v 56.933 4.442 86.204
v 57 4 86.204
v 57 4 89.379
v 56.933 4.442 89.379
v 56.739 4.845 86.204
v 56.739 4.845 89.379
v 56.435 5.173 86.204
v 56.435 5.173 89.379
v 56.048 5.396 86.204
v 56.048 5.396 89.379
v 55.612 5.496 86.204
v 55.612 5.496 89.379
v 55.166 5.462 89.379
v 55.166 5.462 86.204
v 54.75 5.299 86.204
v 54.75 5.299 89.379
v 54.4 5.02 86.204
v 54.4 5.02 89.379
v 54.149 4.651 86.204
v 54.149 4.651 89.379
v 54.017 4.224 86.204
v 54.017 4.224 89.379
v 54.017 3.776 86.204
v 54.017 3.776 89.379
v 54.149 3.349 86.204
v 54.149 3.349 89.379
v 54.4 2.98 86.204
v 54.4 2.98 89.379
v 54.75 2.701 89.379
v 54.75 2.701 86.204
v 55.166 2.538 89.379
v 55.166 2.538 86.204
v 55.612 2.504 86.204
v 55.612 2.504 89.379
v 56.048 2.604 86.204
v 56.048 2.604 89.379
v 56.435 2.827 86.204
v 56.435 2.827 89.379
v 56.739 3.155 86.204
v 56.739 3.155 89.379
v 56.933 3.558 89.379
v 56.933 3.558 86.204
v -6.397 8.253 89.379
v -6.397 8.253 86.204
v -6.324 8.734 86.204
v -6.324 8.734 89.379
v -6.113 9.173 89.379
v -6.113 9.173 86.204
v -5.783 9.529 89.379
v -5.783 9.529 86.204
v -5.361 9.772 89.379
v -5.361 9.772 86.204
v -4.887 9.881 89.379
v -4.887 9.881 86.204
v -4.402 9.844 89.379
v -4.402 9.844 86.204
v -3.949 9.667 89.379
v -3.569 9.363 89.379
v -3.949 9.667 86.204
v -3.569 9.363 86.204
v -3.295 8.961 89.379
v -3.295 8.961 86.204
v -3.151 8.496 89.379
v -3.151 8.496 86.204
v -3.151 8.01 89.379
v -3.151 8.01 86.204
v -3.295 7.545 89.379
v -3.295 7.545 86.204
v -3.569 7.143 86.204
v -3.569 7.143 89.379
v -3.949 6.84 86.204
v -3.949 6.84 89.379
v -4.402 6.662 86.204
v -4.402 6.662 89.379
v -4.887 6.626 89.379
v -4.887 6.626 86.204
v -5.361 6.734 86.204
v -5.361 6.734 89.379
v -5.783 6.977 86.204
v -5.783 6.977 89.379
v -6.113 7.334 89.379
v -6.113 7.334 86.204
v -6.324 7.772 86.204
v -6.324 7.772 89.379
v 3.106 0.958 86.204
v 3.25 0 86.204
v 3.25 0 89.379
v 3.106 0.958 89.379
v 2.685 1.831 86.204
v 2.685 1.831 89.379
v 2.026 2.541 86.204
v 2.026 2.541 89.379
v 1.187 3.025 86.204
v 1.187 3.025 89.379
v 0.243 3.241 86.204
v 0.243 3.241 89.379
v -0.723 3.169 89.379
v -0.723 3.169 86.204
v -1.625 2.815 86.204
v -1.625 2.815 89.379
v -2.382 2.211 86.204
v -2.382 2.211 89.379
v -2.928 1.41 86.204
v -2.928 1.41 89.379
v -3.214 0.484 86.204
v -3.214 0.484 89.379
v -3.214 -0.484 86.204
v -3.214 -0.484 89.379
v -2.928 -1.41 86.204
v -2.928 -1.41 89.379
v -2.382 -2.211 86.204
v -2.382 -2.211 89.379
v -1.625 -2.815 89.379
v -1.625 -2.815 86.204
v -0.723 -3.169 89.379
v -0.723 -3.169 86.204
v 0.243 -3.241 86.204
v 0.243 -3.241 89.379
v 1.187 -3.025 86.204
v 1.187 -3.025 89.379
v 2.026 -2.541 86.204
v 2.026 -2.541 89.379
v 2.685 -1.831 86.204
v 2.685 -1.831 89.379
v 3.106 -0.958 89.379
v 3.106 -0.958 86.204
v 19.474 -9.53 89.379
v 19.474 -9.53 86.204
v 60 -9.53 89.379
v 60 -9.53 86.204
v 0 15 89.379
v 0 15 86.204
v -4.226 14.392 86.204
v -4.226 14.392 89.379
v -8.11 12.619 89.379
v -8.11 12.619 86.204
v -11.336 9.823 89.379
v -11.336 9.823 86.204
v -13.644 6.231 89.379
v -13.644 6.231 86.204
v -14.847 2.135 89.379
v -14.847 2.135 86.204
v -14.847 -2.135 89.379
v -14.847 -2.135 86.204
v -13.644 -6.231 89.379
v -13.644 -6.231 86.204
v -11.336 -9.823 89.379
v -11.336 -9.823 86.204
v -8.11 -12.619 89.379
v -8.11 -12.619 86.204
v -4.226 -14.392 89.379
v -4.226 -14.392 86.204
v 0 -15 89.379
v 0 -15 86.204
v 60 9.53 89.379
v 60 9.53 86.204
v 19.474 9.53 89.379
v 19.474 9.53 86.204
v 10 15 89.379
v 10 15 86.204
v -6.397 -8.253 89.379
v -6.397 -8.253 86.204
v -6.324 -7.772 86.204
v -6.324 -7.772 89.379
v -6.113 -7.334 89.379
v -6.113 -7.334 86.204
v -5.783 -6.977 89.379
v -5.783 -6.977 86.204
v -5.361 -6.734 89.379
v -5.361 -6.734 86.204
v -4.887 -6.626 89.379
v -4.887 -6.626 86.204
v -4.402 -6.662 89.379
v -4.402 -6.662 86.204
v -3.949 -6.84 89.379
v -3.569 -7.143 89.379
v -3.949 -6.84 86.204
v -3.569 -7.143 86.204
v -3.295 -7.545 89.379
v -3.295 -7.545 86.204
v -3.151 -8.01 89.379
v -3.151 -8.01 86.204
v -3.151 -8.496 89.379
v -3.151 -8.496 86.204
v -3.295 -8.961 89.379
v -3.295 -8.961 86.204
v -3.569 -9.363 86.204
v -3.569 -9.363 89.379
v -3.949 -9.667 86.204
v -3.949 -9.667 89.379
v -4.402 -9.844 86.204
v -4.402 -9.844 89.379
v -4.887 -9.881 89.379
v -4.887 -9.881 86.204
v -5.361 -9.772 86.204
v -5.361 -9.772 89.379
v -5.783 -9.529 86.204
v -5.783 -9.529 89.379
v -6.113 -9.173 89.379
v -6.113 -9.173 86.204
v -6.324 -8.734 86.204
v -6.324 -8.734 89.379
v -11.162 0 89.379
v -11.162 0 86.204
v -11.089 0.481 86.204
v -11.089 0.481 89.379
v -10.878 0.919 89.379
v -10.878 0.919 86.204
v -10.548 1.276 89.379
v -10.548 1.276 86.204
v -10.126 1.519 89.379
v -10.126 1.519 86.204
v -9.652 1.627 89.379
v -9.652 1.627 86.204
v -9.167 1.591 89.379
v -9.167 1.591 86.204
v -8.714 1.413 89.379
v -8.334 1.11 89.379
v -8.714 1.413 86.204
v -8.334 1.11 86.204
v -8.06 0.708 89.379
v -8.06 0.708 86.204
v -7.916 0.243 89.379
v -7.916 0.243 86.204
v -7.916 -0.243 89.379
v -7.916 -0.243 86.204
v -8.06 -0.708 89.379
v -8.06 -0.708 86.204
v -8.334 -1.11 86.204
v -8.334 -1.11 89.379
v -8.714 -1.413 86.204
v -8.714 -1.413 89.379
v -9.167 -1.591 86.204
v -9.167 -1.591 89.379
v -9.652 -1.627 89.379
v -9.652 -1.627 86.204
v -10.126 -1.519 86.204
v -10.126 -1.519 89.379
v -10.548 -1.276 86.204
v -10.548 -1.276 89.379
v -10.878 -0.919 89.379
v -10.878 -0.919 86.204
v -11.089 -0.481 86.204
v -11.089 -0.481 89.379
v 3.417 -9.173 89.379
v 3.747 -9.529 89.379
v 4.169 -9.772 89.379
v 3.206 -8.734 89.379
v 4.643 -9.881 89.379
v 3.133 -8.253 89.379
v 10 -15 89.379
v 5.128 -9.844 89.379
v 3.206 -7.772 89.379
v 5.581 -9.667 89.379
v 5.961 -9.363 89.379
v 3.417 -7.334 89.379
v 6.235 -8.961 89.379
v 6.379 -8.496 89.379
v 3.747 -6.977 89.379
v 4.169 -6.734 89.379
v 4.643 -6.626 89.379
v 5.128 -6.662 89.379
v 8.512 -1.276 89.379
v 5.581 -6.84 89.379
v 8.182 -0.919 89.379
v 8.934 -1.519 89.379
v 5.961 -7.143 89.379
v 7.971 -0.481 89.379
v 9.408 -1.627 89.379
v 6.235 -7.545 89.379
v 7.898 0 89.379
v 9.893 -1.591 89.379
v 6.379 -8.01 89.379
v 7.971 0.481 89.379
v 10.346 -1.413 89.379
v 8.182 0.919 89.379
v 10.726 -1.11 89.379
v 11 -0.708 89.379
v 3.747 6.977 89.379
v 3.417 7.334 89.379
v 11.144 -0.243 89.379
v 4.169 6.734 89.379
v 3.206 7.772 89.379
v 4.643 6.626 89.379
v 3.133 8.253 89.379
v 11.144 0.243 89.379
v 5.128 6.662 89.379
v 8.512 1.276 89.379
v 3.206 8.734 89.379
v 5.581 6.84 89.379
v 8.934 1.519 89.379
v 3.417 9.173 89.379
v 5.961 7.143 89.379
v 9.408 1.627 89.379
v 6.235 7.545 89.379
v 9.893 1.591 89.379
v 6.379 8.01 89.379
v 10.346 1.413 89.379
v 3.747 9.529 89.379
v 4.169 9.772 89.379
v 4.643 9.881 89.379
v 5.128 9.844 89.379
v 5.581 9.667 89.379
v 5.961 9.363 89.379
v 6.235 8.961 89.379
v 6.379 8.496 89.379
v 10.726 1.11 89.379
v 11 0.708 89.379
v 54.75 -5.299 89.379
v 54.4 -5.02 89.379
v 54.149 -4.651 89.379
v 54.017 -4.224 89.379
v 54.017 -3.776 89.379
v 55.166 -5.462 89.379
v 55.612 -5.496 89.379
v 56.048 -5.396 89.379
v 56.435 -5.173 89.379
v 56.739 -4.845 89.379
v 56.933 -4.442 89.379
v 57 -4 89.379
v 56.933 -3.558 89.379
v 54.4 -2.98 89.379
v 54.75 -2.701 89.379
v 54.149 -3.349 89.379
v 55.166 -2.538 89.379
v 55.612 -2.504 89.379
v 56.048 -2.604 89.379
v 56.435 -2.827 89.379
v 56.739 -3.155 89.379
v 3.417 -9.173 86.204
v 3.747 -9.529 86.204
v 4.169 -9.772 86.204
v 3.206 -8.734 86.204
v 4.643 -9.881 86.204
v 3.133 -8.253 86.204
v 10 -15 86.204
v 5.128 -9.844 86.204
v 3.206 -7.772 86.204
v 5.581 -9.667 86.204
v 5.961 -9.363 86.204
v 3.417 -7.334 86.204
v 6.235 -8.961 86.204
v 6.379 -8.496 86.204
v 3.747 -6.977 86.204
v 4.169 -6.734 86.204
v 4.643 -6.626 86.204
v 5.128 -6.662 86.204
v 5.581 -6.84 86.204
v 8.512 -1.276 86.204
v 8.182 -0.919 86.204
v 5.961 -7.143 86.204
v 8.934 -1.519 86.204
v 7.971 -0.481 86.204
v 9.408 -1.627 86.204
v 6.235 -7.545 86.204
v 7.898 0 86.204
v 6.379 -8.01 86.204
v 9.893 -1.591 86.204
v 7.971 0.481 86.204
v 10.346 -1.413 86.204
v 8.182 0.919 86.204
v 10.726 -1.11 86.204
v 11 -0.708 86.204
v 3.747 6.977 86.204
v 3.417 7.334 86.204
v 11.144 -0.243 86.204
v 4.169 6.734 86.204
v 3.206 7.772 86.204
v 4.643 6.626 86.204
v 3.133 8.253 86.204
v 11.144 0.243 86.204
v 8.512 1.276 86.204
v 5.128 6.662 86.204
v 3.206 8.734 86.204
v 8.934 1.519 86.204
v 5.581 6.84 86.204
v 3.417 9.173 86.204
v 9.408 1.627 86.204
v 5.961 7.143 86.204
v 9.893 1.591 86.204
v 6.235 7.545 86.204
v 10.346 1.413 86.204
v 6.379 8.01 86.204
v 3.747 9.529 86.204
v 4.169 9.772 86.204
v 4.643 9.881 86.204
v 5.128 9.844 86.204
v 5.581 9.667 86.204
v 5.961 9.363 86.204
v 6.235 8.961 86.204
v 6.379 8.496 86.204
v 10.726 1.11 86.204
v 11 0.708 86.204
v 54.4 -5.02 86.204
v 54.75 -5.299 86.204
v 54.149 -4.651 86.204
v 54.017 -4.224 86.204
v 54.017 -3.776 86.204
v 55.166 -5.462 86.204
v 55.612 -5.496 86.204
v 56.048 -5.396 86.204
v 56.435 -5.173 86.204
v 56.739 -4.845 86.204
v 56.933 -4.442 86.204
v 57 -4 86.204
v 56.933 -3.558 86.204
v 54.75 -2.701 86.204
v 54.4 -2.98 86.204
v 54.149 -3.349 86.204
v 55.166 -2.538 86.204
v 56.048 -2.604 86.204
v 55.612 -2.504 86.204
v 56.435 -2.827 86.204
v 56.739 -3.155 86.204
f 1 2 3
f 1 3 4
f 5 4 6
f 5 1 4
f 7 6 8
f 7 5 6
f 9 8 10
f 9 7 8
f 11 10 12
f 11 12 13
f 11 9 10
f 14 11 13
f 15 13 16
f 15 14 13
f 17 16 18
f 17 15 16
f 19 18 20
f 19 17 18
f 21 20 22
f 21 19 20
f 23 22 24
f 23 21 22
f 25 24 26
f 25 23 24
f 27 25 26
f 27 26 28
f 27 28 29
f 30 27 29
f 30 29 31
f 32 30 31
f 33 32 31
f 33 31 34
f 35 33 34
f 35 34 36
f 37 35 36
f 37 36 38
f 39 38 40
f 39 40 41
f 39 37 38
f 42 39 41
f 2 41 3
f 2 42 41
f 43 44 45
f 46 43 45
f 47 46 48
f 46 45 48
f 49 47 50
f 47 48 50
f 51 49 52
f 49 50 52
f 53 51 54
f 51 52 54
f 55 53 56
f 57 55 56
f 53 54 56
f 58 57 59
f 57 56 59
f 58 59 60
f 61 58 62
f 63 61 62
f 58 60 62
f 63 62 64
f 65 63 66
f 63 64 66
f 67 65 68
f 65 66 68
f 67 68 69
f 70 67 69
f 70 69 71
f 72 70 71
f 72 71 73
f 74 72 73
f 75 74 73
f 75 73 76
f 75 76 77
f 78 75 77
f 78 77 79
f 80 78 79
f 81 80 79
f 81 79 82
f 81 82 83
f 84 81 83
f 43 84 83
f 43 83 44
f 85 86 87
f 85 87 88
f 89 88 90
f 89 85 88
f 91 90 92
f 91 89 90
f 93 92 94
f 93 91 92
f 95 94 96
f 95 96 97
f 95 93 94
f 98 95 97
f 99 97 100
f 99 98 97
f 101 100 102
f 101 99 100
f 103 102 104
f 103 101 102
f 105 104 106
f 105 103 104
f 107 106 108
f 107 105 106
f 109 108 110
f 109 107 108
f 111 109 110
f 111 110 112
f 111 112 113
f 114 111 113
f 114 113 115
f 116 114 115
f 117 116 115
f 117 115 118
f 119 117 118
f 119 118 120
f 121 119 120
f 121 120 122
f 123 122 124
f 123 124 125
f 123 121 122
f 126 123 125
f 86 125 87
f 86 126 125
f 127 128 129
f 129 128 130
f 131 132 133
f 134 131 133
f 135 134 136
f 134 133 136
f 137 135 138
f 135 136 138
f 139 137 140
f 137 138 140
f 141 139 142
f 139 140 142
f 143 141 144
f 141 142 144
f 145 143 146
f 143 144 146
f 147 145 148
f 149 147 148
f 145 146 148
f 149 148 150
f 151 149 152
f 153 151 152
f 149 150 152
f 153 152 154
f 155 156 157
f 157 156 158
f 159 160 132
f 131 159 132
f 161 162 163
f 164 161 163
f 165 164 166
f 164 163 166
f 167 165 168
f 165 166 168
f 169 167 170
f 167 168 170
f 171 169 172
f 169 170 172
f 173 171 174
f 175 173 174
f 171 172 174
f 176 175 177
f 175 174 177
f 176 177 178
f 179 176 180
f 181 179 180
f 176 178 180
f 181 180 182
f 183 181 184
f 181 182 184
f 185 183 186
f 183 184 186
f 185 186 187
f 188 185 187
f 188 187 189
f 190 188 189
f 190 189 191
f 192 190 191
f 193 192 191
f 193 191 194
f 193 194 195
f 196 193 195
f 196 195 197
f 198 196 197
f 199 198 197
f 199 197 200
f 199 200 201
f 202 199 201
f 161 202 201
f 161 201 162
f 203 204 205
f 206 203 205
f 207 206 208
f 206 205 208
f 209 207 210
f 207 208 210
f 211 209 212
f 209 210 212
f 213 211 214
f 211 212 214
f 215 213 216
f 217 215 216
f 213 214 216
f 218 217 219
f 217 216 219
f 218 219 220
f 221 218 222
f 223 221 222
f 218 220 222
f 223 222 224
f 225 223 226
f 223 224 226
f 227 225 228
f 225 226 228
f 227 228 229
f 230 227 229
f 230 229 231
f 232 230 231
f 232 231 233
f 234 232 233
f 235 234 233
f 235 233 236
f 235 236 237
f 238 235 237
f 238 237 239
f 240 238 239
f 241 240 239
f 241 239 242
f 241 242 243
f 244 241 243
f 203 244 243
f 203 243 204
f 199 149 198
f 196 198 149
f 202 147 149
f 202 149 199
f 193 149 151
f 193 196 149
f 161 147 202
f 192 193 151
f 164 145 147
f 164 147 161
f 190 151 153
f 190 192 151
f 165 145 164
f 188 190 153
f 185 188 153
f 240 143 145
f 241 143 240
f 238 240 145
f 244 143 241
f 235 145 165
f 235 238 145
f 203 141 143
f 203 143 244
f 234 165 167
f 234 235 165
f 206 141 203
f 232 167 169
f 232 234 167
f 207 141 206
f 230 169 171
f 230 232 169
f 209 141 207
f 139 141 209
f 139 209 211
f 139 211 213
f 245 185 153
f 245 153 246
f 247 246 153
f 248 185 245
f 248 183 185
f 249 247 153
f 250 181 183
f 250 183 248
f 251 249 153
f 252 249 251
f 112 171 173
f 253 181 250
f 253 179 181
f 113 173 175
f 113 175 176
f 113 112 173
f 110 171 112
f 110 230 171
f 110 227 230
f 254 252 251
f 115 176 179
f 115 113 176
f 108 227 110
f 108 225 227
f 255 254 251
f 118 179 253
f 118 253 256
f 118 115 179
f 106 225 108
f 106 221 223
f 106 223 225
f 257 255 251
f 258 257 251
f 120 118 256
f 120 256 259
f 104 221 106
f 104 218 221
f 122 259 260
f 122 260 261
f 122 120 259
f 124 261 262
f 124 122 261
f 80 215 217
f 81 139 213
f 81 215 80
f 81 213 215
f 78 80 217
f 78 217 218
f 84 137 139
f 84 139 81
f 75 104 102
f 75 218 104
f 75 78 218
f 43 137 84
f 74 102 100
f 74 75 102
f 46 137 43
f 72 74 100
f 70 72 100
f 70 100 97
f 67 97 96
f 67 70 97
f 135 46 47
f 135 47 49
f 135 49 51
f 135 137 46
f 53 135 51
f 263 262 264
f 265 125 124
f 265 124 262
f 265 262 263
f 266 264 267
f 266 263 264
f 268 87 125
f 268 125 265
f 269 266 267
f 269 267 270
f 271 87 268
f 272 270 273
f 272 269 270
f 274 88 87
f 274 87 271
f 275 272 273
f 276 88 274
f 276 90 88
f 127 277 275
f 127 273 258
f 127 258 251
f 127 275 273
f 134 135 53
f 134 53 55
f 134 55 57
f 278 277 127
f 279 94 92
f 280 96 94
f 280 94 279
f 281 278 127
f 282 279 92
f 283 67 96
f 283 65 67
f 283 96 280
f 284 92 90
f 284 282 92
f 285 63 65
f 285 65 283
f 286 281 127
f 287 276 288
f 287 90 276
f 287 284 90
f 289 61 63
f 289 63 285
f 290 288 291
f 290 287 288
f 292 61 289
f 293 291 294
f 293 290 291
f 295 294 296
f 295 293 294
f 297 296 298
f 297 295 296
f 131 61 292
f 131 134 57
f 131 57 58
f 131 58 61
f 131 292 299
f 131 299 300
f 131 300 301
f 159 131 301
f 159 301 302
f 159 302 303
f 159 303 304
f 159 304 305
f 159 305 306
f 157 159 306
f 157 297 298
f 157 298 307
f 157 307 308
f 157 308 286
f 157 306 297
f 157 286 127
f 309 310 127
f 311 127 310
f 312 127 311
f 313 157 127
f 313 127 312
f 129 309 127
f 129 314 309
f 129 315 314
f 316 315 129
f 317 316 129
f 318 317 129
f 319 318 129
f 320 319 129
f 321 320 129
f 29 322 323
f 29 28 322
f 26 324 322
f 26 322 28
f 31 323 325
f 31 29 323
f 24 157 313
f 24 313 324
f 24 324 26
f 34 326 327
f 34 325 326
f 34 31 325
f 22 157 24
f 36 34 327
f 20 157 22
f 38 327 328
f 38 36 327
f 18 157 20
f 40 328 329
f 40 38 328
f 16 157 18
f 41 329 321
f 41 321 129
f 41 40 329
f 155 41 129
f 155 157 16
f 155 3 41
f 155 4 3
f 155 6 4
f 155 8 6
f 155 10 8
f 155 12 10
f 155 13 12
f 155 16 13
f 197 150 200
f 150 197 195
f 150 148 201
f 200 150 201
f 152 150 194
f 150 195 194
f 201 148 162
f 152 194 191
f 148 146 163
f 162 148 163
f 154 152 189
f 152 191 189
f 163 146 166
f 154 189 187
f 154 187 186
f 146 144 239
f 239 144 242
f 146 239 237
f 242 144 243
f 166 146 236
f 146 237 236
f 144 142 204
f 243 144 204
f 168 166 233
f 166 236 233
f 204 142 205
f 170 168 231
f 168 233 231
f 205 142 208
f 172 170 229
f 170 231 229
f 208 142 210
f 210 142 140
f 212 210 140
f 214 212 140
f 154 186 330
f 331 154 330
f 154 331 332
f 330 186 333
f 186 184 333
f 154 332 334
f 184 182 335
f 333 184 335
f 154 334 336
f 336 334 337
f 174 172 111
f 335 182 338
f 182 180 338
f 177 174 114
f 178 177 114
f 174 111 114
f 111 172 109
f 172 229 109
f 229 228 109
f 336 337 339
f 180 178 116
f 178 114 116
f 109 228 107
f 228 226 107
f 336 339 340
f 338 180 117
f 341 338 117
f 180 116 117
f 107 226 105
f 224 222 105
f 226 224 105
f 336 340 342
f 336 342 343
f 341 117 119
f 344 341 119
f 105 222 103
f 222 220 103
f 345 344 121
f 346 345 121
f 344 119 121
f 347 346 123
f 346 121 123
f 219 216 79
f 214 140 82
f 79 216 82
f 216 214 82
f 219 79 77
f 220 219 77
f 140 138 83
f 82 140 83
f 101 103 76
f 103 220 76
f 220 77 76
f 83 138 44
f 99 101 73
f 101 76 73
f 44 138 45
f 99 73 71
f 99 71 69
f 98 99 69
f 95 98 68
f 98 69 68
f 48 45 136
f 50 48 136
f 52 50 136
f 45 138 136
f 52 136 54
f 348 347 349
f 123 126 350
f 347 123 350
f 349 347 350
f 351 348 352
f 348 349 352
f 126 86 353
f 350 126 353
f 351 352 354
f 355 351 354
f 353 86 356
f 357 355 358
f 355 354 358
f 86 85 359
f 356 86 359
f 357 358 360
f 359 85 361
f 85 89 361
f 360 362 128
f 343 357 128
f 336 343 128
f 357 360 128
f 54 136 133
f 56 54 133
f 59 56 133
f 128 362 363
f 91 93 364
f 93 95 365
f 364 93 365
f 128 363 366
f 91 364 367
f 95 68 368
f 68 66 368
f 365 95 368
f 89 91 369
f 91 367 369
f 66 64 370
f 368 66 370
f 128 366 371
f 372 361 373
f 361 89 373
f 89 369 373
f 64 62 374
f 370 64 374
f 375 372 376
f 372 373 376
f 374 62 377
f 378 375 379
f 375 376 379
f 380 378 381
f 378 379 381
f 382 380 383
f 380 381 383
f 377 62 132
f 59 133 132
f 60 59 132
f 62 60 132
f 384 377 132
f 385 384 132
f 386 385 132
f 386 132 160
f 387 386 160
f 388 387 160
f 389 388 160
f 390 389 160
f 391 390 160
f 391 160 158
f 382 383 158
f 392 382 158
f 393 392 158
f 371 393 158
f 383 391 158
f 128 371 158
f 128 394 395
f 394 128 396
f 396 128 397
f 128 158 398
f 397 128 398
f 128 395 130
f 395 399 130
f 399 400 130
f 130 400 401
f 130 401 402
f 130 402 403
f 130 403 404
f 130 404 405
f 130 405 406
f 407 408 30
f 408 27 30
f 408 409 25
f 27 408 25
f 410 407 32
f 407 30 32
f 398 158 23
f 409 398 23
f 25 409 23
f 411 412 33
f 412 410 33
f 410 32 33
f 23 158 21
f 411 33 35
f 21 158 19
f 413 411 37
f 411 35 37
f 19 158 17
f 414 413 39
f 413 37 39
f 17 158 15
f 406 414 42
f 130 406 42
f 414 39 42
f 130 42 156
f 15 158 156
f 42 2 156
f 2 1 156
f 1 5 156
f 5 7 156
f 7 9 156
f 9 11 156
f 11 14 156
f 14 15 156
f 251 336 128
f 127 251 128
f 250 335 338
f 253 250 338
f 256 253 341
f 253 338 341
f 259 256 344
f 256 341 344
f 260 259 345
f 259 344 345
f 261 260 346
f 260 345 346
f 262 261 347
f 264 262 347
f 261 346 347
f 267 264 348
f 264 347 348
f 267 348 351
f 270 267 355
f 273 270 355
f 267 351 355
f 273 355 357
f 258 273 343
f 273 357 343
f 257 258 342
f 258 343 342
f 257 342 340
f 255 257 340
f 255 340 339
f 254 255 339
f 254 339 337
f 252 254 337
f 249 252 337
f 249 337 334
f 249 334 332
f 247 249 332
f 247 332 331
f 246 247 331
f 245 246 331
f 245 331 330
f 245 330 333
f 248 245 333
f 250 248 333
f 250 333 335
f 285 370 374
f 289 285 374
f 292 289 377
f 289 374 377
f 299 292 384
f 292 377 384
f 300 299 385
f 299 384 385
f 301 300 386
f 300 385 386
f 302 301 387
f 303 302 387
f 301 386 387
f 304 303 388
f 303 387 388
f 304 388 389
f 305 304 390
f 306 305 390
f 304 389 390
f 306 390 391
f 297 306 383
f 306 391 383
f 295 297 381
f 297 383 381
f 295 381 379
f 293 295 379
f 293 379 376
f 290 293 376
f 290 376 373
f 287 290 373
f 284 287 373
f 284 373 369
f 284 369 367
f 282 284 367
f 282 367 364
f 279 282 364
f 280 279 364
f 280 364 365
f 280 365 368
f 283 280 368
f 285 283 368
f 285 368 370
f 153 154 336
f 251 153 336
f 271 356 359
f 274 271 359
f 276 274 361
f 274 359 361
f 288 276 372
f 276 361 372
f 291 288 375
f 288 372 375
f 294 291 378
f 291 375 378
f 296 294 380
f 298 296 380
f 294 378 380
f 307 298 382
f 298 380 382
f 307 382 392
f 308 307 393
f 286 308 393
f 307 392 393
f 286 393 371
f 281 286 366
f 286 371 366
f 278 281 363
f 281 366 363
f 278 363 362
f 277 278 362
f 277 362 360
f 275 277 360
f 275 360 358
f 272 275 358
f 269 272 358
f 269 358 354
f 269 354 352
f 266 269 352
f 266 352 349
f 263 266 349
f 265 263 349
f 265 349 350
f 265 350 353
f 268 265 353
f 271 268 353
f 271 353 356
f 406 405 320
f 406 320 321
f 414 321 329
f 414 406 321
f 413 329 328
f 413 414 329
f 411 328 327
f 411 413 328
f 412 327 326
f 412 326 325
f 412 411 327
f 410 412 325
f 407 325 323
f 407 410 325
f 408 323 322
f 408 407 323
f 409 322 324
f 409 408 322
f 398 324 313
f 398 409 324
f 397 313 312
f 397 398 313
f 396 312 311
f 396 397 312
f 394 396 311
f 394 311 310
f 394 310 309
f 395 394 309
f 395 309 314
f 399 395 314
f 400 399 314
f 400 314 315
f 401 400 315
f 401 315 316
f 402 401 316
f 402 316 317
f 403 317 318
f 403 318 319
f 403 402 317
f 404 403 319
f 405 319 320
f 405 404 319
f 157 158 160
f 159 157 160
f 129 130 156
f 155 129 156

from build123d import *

# Parameters (mm, degrees)
CROQUIS1_R                      = 1.5
CROQUIS1_R_2                    = 3.25
SALIENTE_EXTRUIR1_DEPTH         = 3.175
TALADRO_DE_MARGEN_PARA_41_D     = 3.2639
TALADRO_DE_MARGEN_PARA_41_DEPTH = 10
TALADRO_DE_MARGEN_PARA_41_TIP   = 0.980574487


with BuildPart() as part:
    # Croquis1 → Saliente-Extruir1 (new body)
    with BuildSketch(Plane.XY.offset(86.203907482)):
        with BuildLine():
            Line((0, -15), (10, -15))
            Line((10, -15), (19.474317917, -9.53))
            Line((19.474317917, -9.53), (60, -9.53))
            Line((60, -9.53), (60, 9.53))
            Line((60, 9.53), (19.474317917, 9.53))
            Line((19.474317917, 9.53), (10, 15))
            Line((10, 15), (0, 15))
            ThreePointArc((0, 15), (-15, 0), (0, -15))
        make_face()
        with Locations((55.5, 4)):
            Circle(CROQUIS1_R, mode=Mode.SUBTRACT)
        Circle(CROQUIS1_R_2, mode=Mode.SUBTRACT)
        with Locations((55.5, -4)):
            Circle(CROQUIS1_R, mode=Mode.SUBTRACT)
    extrude(amount=SALIENTE_EXTRUIR1_DEPTH)

    # Taladro de margen para #41
    with Locations(Plane.XY.offset(89.378907482)):
        with Locations((4.765, 8.253222098), (9.53, 0), (4.765, -8.253222098), (-4.765, -8.253222098), (-9.53, 0), (-4.765, 8.253222098)):
            Hole(TALADRO_DE_MARGEN_PARA_41_D / 2, depth=TALADRO_DE_MARGEN_PARA_41_DEPTH)
            with Locations((0, 0, -(TALADRO_DE_MARGEN_PARA_41_DEPTH + TALADRO_DE_MARGEN_PARA_41_TIP / 2))):  # 118° drill point
                Cone(0, TALADRO_DE_MARGEN_PARA_41_D / 2, TALADRO_DE_MARGEN_PARA_41_TIP, mode=Mode.SUBTRACT)


solid = part.part
